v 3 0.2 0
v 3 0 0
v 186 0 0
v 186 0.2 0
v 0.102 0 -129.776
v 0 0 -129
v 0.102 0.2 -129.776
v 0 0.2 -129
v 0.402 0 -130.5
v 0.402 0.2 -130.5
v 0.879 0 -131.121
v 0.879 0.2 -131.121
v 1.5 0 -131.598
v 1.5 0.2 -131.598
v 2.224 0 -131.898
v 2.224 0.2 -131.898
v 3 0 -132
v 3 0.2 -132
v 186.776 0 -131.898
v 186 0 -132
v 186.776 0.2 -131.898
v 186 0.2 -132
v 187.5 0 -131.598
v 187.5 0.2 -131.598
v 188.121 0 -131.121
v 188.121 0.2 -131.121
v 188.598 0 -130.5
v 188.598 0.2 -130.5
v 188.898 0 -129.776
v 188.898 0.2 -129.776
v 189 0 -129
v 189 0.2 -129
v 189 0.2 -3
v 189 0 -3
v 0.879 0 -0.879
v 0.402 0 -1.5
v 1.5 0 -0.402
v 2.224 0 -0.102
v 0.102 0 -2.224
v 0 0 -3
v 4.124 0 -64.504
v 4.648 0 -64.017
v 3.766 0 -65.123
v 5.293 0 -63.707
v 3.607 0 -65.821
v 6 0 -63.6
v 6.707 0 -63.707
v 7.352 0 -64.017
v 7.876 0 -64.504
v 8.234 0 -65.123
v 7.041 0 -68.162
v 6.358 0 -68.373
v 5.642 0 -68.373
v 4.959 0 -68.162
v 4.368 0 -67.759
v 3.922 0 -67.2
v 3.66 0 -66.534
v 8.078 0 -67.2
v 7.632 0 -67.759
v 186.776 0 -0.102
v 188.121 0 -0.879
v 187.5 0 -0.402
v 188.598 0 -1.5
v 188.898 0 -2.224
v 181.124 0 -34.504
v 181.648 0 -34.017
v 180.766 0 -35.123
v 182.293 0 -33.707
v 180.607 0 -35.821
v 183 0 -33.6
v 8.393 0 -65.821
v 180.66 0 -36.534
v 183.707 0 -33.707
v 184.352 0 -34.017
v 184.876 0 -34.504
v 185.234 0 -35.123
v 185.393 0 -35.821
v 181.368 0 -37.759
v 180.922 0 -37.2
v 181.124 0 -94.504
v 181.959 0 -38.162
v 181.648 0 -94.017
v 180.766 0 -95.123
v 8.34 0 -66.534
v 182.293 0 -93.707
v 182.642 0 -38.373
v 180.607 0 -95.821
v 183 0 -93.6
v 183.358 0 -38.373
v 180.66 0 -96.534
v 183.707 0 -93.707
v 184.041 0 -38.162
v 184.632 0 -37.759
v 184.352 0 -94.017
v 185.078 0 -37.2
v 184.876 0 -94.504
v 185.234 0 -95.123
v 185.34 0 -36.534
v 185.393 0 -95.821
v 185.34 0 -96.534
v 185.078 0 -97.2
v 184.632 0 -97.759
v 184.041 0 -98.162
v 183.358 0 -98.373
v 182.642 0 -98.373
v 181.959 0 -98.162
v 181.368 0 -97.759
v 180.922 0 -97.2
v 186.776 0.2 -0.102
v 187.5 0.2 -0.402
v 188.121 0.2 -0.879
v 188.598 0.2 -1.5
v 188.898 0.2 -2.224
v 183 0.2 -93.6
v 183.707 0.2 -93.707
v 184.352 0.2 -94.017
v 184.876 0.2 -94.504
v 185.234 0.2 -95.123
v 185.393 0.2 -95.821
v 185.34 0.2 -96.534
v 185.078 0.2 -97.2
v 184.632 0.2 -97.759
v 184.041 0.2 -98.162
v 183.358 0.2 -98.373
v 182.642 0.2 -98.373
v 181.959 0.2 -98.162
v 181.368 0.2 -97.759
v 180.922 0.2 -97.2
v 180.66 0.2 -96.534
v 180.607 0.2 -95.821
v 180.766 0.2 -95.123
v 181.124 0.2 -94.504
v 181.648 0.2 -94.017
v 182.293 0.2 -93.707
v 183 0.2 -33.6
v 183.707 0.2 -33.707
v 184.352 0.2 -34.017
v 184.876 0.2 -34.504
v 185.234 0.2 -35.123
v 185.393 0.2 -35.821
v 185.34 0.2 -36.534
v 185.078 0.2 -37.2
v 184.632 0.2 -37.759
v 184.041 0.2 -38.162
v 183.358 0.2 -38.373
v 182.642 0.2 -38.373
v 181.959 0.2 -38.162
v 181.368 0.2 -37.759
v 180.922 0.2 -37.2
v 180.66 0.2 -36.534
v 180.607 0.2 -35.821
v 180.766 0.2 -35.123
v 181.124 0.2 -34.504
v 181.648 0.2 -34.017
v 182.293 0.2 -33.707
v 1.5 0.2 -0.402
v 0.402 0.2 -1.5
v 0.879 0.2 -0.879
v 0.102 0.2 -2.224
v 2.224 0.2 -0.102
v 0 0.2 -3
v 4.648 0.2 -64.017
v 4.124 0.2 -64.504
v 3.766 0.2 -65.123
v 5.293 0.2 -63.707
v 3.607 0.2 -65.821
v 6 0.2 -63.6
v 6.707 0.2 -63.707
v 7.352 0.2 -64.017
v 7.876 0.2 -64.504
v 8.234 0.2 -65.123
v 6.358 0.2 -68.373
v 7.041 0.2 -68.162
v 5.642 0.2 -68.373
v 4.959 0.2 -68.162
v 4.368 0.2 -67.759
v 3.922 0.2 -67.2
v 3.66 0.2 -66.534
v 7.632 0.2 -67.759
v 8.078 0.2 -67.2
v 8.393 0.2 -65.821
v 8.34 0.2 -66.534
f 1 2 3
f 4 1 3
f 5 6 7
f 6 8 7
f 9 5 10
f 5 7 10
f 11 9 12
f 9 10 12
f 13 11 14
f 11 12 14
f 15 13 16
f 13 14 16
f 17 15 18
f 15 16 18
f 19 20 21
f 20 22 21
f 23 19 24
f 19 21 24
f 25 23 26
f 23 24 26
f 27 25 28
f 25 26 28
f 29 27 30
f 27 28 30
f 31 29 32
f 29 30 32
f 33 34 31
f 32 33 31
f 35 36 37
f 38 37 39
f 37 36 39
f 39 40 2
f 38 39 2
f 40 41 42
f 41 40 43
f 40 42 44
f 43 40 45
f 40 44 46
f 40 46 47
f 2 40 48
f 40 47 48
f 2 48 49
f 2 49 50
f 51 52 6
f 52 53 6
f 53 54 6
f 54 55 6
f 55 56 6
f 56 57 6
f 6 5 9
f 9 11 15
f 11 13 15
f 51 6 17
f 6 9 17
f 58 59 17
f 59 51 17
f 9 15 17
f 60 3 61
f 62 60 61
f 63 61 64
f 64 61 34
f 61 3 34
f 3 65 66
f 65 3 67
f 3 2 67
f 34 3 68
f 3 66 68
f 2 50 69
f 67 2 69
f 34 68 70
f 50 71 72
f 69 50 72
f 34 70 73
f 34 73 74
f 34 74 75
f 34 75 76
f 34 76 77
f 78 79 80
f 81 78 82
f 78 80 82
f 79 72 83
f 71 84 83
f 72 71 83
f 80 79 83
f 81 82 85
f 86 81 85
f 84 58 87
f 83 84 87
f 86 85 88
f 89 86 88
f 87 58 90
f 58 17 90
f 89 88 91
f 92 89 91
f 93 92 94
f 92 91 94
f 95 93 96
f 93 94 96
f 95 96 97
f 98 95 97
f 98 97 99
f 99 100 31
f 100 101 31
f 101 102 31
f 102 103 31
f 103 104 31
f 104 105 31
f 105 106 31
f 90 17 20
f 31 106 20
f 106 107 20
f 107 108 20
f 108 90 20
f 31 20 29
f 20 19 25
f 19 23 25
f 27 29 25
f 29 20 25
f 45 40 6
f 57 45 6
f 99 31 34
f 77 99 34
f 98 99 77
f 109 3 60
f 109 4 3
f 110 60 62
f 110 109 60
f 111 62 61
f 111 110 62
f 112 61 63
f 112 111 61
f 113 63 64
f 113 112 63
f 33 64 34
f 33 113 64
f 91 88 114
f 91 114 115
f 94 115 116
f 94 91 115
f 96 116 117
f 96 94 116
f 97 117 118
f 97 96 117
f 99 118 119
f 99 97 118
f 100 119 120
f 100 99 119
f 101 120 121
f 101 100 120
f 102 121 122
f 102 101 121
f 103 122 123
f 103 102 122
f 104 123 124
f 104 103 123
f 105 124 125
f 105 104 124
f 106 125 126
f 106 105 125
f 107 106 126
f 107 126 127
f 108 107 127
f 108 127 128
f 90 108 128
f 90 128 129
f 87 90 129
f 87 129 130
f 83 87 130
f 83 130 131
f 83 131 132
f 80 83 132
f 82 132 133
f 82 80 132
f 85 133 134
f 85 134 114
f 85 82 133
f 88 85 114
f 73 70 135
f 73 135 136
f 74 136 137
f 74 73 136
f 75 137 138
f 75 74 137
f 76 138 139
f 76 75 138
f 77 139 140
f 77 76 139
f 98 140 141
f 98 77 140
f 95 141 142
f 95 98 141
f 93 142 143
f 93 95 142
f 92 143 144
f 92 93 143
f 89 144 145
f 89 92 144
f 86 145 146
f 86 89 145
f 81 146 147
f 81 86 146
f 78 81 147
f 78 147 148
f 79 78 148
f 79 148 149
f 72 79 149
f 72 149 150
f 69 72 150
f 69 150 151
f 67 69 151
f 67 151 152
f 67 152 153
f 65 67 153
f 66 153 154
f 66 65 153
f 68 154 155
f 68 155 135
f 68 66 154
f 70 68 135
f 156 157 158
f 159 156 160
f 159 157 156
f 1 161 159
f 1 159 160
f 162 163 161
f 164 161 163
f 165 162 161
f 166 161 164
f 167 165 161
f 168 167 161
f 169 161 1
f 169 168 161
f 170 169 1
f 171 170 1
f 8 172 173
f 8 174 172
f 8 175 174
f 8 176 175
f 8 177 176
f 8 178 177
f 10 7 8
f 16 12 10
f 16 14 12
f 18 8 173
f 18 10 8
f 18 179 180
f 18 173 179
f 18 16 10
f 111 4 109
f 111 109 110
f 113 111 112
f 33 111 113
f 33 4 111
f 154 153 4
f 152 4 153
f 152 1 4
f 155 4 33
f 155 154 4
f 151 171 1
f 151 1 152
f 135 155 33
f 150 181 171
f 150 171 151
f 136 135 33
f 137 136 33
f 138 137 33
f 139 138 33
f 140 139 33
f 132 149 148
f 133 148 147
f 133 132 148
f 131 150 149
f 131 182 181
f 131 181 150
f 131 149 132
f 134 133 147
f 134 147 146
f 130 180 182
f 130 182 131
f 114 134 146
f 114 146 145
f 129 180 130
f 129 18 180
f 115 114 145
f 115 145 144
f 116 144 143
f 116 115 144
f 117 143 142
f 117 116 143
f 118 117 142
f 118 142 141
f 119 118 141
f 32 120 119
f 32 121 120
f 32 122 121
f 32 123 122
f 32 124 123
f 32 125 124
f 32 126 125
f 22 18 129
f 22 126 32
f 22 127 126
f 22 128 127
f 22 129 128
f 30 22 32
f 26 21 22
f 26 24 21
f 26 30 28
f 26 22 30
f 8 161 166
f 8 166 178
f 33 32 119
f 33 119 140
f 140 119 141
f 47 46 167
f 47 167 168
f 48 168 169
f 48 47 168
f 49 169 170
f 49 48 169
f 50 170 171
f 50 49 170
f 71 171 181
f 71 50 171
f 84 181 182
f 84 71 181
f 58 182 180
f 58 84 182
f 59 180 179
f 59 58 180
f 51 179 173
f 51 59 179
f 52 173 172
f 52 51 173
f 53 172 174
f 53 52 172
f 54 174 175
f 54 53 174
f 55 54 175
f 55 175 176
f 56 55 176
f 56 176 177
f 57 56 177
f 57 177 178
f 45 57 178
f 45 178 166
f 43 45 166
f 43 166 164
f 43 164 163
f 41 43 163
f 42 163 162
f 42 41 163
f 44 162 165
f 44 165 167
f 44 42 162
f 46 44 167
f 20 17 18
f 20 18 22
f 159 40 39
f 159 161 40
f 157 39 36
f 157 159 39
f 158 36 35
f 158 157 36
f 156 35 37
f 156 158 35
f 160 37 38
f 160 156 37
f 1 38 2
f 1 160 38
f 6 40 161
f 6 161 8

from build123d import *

# Parameters (mm, degrees)
SKETCH1_W           = 189
SKETCH1_H           = 132
SKETCH1_R           = 2.4
BOSS_EXTRUDE1_DEPTH = 0.2
FILLET1_R           = 3


with BuildPart() as part:
    # Sketch1 → Boss-Extrude1 (new body)
    with BuildSketch(Plane(origin=(0, 0, 0), x_dir=(1, 0, 0), z_dir=(0, 1, 0))):
        with Locations((94.5, 66)):
            Rectangle(SKETCH1_W, SKETCH1_H)
        with Locations(Location((6, 66, 0), (0, 0, 270))):
            Circle(SKETCH1_R, mode=Mode.SUBTRACT)
        with Locations(Location((183, 36, 0), (0, 0, 270))):
            Circle(SKETCH1_R, mode=Mode.SUBTRACT)
        with Locations(Location((183, 96, 0), (0, 0, 270))):
            Circle(SKETCH1_R, mode=Mode.SUBTRACT)
    extrude(amount=BOSS_EXTRUDE1_DEPTH)

    # Fillet1
    fillet1_edges = [part.edges().sort_by_distance(p)[0] for p in [
        (0, 0.1, -132),
        (189, 0.1, -132),
        (189, 0.1, 0),
        (0, 0.1, 0),
    ]]
    fillet(fillet1_edges, radius=FILLET1_R)


solid = part.part
